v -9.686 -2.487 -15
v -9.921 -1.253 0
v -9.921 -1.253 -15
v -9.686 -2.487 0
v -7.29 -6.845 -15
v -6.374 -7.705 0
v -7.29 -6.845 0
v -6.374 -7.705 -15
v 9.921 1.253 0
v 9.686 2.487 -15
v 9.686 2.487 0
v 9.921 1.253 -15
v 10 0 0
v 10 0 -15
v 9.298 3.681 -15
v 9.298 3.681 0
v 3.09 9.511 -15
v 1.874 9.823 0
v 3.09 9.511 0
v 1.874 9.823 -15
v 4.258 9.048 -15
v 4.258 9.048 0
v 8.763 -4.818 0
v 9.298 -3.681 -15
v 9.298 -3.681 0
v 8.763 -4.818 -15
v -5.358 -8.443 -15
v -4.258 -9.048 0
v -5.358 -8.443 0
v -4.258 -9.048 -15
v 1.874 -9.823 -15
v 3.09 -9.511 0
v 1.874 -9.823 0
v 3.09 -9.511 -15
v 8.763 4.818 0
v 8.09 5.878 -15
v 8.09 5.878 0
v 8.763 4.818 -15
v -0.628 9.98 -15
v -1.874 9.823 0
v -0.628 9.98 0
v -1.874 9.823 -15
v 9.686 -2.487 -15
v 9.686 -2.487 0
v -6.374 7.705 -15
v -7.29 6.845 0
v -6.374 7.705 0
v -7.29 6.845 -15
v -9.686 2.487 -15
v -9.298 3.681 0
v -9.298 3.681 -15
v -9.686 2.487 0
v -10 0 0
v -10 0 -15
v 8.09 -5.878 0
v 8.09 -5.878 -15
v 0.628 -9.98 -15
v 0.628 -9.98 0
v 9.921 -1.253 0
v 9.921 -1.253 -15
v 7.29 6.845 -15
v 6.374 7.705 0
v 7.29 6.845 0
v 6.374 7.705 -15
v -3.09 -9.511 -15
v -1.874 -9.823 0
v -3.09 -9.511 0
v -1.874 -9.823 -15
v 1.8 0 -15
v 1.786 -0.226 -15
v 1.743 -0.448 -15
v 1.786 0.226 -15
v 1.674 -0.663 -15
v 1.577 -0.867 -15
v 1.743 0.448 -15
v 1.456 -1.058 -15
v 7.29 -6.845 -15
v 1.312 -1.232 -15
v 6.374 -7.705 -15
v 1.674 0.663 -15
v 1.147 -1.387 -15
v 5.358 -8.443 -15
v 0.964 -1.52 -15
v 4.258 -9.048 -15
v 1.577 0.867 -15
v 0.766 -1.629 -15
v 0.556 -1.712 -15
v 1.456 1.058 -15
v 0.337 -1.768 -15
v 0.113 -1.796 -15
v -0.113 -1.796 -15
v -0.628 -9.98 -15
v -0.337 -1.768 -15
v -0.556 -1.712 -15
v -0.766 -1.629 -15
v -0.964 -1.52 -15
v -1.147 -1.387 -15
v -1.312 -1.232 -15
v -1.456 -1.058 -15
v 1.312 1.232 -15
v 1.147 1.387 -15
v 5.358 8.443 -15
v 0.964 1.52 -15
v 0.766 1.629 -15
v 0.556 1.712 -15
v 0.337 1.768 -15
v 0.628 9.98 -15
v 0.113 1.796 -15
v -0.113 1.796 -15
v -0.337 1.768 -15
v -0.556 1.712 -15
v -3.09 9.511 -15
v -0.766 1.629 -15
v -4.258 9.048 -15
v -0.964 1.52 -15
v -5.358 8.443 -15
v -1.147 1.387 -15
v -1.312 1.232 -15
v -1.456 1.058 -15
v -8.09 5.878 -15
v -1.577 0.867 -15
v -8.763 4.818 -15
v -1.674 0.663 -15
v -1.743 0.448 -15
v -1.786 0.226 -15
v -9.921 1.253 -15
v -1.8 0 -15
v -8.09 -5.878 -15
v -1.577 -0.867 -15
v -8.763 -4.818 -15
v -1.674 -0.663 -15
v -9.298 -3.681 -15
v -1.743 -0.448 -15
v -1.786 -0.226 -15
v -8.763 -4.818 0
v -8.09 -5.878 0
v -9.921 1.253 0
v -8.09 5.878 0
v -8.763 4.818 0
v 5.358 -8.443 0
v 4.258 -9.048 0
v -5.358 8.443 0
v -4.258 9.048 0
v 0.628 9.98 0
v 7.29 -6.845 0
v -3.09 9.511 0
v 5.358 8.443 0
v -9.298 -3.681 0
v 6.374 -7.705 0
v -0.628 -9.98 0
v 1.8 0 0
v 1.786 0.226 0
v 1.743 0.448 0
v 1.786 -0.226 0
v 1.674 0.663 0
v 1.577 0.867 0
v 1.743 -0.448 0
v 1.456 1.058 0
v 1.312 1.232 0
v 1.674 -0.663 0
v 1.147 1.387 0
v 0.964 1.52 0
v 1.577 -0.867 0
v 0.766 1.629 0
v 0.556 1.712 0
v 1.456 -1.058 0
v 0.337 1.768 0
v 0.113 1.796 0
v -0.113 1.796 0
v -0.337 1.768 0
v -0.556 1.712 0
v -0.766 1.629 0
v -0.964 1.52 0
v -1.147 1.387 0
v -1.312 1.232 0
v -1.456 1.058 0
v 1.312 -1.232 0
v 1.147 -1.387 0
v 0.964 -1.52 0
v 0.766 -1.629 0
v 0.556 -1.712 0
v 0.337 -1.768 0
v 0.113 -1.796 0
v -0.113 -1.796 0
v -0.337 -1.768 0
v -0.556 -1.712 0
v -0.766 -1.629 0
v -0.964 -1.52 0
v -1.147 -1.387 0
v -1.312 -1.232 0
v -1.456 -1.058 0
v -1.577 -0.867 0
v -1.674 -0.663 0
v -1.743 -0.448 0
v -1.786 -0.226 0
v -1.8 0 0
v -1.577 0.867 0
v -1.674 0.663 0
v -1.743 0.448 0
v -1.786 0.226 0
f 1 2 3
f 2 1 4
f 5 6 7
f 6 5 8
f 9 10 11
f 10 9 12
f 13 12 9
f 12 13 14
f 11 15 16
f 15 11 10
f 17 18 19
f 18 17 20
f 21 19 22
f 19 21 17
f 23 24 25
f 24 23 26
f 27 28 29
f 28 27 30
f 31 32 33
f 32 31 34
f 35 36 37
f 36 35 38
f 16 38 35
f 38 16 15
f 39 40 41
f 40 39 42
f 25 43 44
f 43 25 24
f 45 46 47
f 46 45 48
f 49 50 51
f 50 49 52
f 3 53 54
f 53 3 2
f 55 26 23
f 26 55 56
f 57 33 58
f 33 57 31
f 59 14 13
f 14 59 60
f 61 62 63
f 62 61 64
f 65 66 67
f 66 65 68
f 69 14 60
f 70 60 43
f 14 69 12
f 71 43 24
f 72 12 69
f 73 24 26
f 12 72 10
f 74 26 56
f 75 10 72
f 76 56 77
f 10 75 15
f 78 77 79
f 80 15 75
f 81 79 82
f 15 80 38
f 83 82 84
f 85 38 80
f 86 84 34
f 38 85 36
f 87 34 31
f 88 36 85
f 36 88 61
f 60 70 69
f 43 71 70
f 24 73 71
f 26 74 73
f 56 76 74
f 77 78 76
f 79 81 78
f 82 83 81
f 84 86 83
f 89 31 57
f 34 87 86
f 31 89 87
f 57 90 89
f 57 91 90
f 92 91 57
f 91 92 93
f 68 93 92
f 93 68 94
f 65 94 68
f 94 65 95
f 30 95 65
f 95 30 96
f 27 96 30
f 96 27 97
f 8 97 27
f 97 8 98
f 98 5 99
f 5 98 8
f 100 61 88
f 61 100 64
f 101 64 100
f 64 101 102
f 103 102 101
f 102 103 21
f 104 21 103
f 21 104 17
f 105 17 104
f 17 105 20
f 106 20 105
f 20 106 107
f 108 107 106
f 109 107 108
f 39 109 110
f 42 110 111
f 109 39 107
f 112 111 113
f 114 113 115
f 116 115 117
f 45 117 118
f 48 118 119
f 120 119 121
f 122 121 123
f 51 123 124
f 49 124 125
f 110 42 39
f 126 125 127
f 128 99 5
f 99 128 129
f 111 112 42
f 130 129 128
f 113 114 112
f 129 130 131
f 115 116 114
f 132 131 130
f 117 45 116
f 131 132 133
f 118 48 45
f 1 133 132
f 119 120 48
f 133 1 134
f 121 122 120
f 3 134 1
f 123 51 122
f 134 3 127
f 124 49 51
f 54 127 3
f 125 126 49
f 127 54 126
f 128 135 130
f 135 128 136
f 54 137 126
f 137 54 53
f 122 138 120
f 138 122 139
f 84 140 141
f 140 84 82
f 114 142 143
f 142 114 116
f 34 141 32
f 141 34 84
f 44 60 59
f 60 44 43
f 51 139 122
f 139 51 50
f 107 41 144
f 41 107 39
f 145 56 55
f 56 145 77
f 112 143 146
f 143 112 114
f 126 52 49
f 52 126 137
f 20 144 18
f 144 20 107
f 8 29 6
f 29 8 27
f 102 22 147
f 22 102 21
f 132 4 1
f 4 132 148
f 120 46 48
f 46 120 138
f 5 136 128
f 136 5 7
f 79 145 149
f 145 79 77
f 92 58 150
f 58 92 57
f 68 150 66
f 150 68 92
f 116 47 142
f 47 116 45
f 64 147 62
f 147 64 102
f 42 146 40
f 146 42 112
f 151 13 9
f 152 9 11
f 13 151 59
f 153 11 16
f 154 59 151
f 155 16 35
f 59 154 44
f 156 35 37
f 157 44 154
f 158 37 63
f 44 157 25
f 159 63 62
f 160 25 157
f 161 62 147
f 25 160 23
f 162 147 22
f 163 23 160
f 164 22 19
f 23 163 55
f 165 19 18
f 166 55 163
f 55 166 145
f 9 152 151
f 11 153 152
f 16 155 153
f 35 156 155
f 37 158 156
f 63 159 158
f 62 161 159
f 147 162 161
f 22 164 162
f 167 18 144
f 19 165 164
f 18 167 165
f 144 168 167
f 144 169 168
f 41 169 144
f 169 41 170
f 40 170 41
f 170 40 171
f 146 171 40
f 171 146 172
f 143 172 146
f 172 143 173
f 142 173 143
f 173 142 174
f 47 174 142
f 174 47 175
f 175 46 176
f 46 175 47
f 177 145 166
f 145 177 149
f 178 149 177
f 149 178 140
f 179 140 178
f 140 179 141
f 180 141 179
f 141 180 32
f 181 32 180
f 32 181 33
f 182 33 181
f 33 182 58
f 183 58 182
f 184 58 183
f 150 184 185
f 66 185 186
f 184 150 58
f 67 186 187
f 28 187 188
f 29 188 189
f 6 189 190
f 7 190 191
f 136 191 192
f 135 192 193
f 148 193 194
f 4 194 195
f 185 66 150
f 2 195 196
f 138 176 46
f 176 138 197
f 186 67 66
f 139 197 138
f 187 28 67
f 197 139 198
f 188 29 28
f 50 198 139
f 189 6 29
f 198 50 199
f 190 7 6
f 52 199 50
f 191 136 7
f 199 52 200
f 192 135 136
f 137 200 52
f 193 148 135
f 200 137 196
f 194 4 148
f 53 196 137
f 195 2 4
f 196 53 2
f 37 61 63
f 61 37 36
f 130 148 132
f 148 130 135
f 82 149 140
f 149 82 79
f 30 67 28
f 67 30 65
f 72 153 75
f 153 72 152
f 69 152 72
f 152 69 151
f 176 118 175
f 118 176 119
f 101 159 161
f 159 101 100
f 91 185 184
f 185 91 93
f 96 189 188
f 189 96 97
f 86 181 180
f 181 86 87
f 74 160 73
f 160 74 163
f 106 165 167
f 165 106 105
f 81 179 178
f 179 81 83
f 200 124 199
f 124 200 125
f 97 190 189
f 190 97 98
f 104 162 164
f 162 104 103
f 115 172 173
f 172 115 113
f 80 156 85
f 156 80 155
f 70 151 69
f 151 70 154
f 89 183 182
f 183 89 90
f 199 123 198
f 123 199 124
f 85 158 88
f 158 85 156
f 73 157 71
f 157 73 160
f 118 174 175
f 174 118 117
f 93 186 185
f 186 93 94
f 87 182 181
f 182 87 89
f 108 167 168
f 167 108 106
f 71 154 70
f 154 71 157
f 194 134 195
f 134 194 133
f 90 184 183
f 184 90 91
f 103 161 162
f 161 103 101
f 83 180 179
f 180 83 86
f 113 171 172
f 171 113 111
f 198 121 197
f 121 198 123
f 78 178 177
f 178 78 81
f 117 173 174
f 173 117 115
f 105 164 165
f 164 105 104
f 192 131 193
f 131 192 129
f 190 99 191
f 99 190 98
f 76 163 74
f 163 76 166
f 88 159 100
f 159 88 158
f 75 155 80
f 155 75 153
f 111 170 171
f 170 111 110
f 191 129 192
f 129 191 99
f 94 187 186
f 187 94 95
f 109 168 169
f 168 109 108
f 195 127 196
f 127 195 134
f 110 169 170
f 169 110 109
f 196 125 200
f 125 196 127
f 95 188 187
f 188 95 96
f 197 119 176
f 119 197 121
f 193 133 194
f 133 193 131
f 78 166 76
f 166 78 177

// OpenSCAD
$fn = 50;


difference() {
	union() {
		translate(v = [0, 0, -15.0000000000]) {
			cylinder(h = 15, r = 10.0000000000);
		}
		cylinder(h = 0, r = 13.0000000000);
	}
	union() {
		#translate(v = [0, 0, -15]) {
			cylinder(h = 15, r = 1.8000000000);
		}
	}
}
